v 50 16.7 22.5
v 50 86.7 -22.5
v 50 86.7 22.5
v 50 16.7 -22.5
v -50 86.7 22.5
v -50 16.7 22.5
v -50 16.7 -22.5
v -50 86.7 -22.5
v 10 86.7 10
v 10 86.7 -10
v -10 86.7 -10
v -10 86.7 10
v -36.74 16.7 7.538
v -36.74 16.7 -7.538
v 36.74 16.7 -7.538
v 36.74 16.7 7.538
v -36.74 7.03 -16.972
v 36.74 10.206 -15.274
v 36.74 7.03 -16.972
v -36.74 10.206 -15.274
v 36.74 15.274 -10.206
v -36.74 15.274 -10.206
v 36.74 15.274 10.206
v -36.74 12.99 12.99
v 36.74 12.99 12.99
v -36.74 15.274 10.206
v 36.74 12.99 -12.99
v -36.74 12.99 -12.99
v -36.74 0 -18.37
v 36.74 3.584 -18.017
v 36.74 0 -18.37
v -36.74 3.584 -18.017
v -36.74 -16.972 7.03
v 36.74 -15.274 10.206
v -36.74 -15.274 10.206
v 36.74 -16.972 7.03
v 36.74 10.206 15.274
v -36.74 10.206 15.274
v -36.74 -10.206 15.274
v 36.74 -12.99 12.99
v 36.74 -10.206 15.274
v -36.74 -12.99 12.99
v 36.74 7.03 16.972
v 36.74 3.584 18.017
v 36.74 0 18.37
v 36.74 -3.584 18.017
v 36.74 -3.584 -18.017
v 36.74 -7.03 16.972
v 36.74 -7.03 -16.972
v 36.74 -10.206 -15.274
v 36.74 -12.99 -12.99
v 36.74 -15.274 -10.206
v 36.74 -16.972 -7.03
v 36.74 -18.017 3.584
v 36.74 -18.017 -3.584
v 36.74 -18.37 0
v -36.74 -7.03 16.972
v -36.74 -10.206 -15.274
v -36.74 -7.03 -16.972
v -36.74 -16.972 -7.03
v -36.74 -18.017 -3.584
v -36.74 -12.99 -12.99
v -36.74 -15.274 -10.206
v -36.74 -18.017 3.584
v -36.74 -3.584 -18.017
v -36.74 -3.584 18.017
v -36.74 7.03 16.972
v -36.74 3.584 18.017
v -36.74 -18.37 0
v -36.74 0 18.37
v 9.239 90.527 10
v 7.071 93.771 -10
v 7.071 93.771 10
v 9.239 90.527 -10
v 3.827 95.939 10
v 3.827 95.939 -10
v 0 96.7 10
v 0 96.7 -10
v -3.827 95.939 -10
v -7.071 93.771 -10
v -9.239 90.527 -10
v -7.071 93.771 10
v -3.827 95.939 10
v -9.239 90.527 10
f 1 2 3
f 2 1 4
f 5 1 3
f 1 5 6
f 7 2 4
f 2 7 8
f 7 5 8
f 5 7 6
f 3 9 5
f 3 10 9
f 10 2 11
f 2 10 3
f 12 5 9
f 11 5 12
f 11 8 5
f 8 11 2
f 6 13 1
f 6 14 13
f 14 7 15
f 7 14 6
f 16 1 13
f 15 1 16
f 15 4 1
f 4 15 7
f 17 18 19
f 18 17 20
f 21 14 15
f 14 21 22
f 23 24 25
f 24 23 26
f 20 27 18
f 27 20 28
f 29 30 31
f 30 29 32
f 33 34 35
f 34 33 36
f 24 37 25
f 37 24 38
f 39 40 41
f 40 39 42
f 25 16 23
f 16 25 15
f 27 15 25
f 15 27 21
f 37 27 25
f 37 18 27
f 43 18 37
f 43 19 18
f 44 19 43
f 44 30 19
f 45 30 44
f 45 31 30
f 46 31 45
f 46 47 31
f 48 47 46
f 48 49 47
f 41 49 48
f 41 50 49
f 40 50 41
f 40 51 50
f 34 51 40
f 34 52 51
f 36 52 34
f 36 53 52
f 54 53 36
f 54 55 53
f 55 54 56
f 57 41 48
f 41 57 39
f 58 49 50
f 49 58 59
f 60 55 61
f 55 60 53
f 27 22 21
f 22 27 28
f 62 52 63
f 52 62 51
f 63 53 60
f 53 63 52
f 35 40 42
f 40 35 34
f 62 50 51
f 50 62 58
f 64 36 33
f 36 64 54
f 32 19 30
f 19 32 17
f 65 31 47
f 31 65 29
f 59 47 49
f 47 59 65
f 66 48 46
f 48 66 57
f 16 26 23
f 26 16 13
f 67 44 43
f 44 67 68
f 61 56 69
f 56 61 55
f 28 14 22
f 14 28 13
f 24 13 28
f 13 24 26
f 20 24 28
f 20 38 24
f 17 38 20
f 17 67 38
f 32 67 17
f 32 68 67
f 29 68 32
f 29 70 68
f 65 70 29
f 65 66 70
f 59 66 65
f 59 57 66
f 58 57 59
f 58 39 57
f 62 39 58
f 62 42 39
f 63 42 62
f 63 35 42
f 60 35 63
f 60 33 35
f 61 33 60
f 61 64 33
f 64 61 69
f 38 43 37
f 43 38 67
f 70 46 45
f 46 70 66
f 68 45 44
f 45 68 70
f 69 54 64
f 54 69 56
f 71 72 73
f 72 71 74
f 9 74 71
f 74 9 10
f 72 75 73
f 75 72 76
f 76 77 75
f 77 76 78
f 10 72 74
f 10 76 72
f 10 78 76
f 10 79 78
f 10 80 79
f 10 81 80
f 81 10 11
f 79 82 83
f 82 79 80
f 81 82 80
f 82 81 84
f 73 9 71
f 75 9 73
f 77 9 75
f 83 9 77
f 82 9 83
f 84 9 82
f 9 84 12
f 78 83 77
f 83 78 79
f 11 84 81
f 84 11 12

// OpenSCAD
// Auto-generated by scripts/author_from_manifest.py (Phase D.3).
// Source: data/phase_d_manifest.json (sku_intent='agf-1011-inspector-test').
// Do not hand-edit — regenerate from the manifest.
//
// @part agf_1011_inspector_test
// @kind device
// @category trim.inspector.test
// @display-name "AGF 1011 Inspector's Test & Drain Valve 1\""
// @mfg agf_manufacturing
// @mfg-pn 1011
// @listing UL
// @price-usd 145.00
// @install-minutes 25
// @crew journeyman
// @param size_in number default=1 label="Size" unit="in"
// @port inlet position=[0,0,0] direction=[0,0,-1] style=NPT_threaded size_in=1 role=run_a

size_in = 1.0;

function od_mm(nps) =
    nps ==   1  ? 33.4 :
    nps == 1.25 ? 42.2 :
    nps == 1.5  ? 48.3 :
    nps ==   2  ? 60.3 : 33.4;

od = od_mm(size_in);
box_w = 100;
box_h = 70;
box_d = 45;

union() {
    // Enclosure
    translate([0, box_h/2 + od/2, 0])
        cube([box_w, box_h, box_d], center = true);
    // Pipe saddle stub
    rotate([0, 90, 0])
        cylinder(h = od * 2.2, d = od * 1.1, center = true, $fn = 32);
    // Conduit nipple
    translate([0, box_h + od/2, 0])
        cylinder(h = 20, d = 20, center = true, $fn = 16);
}
